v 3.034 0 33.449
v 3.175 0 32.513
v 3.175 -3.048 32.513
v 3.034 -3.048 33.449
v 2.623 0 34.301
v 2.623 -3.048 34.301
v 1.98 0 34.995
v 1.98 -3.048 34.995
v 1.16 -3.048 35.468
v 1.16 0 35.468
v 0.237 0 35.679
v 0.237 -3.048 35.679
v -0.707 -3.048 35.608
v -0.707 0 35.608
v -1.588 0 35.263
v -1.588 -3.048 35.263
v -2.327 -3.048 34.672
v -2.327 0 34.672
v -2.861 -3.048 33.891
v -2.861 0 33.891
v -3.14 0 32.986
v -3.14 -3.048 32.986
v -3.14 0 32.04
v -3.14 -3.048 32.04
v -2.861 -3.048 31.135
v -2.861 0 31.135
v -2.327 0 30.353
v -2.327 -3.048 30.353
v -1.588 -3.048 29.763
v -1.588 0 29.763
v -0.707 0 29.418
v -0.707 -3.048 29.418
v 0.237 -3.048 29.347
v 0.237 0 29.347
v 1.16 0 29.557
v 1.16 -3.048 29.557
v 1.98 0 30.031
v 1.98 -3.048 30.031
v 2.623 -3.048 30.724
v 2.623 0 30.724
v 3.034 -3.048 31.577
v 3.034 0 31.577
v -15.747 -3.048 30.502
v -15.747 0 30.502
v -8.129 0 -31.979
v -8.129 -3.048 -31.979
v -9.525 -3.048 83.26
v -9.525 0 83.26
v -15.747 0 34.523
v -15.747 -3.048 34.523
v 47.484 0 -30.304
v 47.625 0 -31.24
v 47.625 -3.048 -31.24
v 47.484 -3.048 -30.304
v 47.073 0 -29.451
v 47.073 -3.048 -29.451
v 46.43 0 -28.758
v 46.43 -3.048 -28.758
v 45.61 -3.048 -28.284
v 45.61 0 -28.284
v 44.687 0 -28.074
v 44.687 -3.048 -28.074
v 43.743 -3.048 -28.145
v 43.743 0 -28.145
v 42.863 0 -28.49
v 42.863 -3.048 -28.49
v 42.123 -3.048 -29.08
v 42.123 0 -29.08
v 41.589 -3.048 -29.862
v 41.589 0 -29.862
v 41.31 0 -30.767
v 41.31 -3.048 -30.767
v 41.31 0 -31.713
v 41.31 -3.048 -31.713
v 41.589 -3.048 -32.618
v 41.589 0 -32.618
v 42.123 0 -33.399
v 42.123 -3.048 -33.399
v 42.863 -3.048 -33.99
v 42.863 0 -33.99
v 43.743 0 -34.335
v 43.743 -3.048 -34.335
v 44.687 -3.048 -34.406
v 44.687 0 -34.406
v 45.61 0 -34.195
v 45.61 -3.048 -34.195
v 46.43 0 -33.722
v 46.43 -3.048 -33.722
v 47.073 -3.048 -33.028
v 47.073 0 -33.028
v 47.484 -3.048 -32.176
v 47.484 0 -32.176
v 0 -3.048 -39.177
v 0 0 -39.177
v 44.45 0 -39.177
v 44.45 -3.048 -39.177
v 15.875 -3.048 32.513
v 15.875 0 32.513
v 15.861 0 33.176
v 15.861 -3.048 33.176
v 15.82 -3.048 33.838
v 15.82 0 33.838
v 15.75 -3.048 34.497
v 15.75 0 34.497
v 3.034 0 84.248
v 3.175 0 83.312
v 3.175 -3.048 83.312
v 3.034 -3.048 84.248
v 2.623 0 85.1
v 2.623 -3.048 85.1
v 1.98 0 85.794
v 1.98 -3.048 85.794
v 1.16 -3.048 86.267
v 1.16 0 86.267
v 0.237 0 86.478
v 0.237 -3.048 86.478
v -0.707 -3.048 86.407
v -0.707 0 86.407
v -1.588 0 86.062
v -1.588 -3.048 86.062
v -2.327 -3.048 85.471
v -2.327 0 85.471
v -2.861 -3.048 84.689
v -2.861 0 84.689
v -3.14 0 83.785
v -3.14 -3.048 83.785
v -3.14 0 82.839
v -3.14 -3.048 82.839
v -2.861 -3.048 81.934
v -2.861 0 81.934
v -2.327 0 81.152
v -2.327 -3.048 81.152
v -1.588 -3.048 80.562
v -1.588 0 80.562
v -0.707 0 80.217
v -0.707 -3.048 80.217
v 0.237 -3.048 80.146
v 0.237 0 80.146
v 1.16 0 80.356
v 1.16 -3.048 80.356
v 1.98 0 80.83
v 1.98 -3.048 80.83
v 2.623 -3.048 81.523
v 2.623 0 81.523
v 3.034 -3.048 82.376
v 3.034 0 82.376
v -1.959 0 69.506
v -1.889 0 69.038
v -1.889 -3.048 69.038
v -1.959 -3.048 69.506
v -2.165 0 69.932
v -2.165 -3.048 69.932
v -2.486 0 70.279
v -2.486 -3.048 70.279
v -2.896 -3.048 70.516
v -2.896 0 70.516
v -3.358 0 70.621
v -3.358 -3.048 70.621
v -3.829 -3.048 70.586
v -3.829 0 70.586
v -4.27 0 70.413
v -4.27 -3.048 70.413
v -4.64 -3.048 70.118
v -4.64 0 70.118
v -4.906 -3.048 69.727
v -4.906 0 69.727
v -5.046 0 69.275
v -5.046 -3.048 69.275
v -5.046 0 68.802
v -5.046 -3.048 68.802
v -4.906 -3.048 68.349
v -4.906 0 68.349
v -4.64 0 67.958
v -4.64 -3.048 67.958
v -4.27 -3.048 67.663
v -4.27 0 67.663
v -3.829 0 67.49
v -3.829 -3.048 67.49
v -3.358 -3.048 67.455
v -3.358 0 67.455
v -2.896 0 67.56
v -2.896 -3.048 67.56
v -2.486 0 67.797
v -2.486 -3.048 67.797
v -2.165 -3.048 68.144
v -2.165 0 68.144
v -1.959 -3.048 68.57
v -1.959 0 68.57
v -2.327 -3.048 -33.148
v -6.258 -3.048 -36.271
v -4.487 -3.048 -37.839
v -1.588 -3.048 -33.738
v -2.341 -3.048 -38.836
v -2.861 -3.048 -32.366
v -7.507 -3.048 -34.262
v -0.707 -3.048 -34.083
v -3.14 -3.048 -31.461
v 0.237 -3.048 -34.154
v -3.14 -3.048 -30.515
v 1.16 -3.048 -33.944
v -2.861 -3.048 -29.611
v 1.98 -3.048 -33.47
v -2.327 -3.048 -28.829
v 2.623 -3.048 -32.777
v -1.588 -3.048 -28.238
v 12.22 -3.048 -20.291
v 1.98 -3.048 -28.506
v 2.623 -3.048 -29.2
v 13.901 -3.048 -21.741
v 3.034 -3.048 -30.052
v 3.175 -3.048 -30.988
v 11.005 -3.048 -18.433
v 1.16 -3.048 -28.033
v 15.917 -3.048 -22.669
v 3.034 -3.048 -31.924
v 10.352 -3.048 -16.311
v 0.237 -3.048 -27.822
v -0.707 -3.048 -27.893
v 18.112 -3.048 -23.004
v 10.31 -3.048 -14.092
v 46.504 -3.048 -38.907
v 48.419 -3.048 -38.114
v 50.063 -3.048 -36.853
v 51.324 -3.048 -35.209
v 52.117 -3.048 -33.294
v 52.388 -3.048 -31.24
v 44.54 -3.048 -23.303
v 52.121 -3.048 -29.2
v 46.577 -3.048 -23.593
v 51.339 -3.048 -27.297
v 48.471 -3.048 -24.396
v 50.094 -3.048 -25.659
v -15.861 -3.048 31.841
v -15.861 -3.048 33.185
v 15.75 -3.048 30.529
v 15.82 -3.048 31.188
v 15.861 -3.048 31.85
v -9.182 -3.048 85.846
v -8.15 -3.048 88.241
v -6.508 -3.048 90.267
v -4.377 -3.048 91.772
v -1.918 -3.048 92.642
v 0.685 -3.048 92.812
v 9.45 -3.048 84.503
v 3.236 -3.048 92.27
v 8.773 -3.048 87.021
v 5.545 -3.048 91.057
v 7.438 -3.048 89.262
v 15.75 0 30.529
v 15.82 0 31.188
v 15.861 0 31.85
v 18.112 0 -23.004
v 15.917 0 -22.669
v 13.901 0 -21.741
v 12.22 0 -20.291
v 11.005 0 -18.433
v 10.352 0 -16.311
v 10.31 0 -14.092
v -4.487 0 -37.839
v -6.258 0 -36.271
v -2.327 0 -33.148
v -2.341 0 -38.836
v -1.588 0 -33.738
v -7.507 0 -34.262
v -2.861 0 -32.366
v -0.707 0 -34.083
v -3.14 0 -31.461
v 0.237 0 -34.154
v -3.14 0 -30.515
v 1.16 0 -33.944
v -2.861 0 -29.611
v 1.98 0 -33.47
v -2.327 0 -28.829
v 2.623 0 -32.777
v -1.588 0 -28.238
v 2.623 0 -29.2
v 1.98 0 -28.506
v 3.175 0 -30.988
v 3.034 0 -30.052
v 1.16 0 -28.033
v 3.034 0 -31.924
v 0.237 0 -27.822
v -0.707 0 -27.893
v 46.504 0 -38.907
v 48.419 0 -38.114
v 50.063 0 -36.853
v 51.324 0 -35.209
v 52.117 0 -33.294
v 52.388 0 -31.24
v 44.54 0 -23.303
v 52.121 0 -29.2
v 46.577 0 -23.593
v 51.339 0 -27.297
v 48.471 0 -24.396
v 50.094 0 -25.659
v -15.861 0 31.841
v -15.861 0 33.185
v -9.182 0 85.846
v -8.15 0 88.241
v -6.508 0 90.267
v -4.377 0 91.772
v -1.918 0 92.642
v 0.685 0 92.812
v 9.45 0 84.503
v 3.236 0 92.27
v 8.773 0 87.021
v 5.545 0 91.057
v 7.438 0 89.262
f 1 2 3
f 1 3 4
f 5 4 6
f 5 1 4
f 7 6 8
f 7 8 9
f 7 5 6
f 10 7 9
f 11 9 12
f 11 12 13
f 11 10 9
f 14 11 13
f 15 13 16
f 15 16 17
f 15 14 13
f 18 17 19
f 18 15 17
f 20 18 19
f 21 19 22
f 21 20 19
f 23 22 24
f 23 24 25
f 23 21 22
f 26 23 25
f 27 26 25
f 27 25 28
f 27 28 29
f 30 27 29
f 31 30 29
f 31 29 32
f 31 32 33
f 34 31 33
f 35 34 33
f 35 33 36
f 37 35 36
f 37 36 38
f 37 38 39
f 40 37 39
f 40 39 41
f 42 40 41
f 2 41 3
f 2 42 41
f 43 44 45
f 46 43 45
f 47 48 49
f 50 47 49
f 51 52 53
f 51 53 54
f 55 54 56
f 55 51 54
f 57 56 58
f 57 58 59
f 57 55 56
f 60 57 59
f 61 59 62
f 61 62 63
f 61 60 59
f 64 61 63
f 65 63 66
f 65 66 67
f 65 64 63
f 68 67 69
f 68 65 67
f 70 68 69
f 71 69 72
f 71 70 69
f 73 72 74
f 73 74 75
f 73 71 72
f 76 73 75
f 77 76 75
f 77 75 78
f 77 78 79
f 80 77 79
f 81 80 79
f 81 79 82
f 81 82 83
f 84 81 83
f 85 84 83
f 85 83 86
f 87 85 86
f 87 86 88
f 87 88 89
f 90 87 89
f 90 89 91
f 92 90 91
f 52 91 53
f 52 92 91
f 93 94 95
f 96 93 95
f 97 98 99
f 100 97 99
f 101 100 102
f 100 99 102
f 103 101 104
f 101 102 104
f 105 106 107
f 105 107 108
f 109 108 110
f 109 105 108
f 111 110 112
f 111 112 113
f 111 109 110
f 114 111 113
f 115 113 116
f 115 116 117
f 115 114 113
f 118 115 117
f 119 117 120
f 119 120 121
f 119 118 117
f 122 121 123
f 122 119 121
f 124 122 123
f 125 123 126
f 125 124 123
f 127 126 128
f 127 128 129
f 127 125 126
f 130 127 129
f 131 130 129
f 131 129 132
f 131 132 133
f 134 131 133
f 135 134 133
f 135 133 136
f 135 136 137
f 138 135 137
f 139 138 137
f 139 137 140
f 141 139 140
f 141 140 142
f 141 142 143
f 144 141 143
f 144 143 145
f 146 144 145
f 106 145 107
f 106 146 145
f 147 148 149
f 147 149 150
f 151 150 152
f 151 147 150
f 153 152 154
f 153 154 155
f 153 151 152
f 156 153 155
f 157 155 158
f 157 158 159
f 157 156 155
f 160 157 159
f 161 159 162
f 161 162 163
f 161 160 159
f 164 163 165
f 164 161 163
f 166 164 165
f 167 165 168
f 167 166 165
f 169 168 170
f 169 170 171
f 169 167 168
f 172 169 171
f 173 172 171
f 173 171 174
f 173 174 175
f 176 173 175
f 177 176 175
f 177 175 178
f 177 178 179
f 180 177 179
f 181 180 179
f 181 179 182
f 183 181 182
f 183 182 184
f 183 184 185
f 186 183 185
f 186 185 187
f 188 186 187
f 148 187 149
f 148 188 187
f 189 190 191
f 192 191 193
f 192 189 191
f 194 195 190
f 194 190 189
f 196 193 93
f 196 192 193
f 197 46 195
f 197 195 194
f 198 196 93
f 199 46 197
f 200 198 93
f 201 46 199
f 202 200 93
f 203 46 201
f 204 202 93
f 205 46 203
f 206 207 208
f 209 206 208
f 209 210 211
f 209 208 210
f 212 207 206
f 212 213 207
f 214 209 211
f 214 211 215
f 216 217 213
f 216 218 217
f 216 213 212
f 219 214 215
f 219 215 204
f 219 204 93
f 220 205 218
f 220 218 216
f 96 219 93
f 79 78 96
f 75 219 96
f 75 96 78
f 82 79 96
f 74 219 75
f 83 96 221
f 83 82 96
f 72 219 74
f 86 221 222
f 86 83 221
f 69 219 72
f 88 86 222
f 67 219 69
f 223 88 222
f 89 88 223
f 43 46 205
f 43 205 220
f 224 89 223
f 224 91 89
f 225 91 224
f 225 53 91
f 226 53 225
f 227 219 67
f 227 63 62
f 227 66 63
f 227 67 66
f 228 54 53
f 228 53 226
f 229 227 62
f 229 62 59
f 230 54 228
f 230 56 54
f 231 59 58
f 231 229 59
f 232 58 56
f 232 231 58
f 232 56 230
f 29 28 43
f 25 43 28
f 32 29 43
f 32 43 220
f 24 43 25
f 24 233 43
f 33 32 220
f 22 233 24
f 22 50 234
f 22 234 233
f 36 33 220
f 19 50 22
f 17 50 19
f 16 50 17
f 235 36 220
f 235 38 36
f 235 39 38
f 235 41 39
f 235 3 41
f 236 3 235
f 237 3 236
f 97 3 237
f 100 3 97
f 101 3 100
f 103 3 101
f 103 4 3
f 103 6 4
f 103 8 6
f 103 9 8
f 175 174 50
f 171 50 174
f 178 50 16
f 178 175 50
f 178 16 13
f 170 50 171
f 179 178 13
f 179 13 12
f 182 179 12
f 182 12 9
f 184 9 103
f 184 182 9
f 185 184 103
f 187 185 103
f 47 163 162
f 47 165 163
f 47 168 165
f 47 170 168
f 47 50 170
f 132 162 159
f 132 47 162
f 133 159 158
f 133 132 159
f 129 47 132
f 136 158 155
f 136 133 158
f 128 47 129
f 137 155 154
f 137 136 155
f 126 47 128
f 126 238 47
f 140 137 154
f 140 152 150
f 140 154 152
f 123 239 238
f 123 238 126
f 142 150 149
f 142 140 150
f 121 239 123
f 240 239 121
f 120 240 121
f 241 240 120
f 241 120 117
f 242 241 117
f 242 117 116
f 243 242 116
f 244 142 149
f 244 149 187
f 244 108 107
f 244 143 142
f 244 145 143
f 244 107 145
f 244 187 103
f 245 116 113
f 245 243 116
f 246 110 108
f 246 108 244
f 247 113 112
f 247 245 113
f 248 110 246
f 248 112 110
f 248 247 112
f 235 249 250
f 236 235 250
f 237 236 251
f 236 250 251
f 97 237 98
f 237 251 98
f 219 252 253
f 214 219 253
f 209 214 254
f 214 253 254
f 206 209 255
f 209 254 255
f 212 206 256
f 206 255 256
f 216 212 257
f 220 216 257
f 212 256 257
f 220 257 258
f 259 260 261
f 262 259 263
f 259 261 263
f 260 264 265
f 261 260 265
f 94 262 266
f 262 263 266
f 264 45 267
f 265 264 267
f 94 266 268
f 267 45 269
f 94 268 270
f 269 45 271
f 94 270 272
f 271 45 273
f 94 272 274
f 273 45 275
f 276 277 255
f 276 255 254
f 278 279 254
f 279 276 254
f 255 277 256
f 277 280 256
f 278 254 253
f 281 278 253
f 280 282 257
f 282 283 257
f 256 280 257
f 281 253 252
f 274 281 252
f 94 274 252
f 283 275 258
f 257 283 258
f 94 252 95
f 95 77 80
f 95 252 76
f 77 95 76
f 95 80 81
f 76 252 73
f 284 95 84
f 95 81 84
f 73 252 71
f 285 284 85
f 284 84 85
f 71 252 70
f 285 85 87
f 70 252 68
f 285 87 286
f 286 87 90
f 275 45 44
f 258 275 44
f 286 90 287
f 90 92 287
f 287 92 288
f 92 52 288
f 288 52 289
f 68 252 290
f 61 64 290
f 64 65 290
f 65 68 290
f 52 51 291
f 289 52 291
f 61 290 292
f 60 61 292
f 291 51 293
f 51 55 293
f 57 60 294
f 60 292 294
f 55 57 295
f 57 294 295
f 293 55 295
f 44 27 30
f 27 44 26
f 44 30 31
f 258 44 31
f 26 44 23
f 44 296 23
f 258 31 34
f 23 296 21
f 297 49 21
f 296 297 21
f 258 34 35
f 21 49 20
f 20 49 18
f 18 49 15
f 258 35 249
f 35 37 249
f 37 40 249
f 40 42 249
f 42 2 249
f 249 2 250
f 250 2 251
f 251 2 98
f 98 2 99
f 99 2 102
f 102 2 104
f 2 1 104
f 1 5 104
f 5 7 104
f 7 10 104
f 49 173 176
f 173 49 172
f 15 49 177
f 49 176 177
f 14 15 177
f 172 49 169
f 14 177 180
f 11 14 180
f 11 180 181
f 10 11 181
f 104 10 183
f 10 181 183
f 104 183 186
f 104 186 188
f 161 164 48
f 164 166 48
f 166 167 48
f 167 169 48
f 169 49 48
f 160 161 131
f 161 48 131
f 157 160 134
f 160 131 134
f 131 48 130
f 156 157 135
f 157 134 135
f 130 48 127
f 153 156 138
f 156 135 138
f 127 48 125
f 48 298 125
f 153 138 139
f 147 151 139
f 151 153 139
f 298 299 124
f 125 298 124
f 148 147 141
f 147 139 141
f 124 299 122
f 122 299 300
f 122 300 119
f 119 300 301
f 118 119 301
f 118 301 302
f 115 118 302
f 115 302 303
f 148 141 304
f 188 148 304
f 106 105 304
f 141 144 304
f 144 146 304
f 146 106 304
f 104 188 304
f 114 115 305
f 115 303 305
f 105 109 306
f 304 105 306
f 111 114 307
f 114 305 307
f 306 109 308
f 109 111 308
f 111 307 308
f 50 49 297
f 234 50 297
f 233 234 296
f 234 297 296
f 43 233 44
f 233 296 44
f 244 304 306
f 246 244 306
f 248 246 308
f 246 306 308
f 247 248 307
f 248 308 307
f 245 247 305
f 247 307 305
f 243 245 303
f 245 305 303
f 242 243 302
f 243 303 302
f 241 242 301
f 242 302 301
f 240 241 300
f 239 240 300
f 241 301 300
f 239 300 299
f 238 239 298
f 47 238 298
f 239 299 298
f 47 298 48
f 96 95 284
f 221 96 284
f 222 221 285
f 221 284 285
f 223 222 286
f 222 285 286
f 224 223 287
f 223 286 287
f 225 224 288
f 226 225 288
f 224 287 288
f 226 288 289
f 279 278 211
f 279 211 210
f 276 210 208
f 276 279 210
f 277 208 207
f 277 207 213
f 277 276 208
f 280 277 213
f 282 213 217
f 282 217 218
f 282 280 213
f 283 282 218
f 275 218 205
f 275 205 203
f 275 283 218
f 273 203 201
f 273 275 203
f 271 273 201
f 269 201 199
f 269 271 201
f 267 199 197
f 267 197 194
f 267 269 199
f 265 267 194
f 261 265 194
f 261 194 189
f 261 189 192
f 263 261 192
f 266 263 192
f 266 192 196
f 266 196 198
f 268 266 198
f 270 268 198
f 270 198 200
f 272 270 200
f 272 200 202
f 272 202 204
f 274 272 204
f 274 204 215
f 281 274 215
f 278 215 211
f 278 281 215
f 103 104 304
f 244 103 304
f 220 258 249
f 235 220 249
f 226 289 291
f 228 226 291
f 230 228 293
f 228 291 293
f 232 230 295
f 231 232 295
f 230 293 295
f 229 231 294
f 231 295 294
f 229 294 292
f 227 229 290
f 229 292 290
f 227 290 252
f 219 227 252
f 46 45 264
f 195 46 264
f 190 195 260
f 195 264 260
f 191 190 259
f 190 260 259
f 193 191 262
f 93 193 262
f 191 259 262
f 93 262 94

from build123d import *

# Parameters (mm, degrees)
F0_R     = 3.175
F0_R_2   = 1.5875
F1_DEPTH = 3.048


with BuildPart() as f1:
    # F0 (on Front) → F1 (new body)
    with BuildSketch(Plane.XZ):
        with BuildLine():
            ThreePointArc((-9.5248581599, 83.2599219897), (0.0259906378, 73.786938532), (9.525, 83.3119030719))
            ThreePointArc((9.525, 83.3119030719), (9.5063041404, 83.9083983282), (9.4502899547, 84.502551959))
            ThreePointArc((9.4502899547, 84.502551959), (-0.6224326586, 92.8165441795), (-9.5248581599, 83.2599219897))
        make_face()
        with Locations((0, 83.3119030719)):
            Circle(F0_R, mode=Mode.SUBTRACT)
        with BuildLine():
            ThreePointArc((9.4502899547, 84.502551959), (9.5063041404, 83.9083983282), (9.525, 83.3119030719))
            ThreePointArc((9.525, 83.3119030719), (0.0259906378, 73.786938532), (-9.5248581599, 83.2599219897))
            Line((-9.5248581599, 83.2599219897), (-15.7471769435, 34.5234055887))
            ThreePointArc((-15.7471769435, 34.5234055887), (0.0131386883, 48.3879167992), (15.7504832578, 34.4973370481))
            Line((15.7504832578, 34.4973370481), (9.4502899547, 84.502551959))
        make_face()
        with Locations((-3.4761622082, 69.0381222362)):
            Circle(F0_R_2, mode=Mode.SUBTRACT)
        with BuildLine():
            Line((15.7504832578, 30.5285074243), (15.7504832578, 34.4973370481))
            ThreePointArc((15.7504832578, 34.4973370481), (0.0131386883, 48.3879167992), (-15.7471769435, 34.5234055887))
            Line((-15.7471769435, 34.5234055887), (-15.7471769435, 30.5024388837))
            ThreePointArc((-15.7471769435, 30.5024388837), (0.0131386883, 16.6379276732), (15.7504832578, 30.5285074243))
        make_face()
        with Locations((0, 32.5129222362)):
            Circle(F0_R, mode=Mode.SUBTRACT)
        with BuildLine():
            ThreePointArc((15.875, 32.5129222362), (15.8438402339, 33.5070809968), (15.7504832578, 34.4973370481))
            Line((15.7504832578, 34.4973370481), (15.7504832578, 30.5285074243))
            ThreePointArc((15.7504832578, 30.5285074243), (15.8438402339, 31.5187634756), (15.875, 32.5129222362))
        make_face()
        with BuildLine():
            Line((-15.7471769435, 30.5024388837), (-15.7471769435, 34.5234055887))
            ThreePointArc((-15.7471769435, 34.5234055887), (-15.875, 32.5129222362), (-15.7471769435, 30.5024388837))
        make_face()
        with BuildLine():
            Line((10.3100811991, -14.091878104), (15.7504832578, 30.5285074243))
            ThreePointArc((15.7504832578, 30.5285074243), (0.0131386883, 16.6379276732), (-15.7471769435, 30.5024388837))
            Line((-15.7471769435, 30.5024388837), (-8.1291402981, -31.9792369364))
            ThreePointArc((-8.1291402981, -31.9792369364), (-0.4964832457, -22.813821126), (8.1893394424, -30.9880969281))
            ThreePointArc((8.1893394424, -30.9880969281), (5.7907374532, -36.7788343813), (0, -39.1774363705))
            Line((0, -39.1774363705), (44.45, -39.1774363705))
            ThreePointArc((44.45, -39.1774363705), (36.5126271282, -31.1950126056), (44.5398460907, -23.3029448794))
            Line((44.5398460907, -23.3029448794), (18.1118481639, -23.003782117))
            ThreePointArc((18.1118481639, -23.003782117), (12.2199839317, -20.2907985961), (10.3100811991, -14.091878104))
        make_face()
        with BuildLine():
            ThreePointArc((8.1893394424, -30.9880969281), (-0.4964832457, -22.813821126), (-8.1291402981, -31.9792369364))
            ThreePointArc((-8.1291402981, -31.9792369364), (-5.4290191812, -37.1192494489), (0, -39.1774363705))
            ThreePointArc((0, -39.1774363705), (5.7907374532, -36.7788343813), (8.1893394424, -30.9880969281))
        make_face()
        with Locations((0, -30.9880969281)):
            Circle(F0_R, mode=Mode.SUBTRACT)
        with BuildLine():
            ThreePointArc((52.3875, -31.2399363705), (50.0943360812, -25.6591320869), (44.5398460907, -23.3029448794))
            ThreePointArc((44.5398460907, -23.3029448794), (36.5126271282, -31.1950126056), (44.45, -39.1774363705))
            ThreePointArc((44.45, -39.1774363705), (50.0626600757, -36.8525964462), (52.3875, -31.2399363705))
        make_face()
        with Locations((44.45, -31.2399363705)):
            Circle(F0_R, mode=Mode.SUBTRACT)
    extrude(amount=F1_DEPTH)


solid = f1.part
